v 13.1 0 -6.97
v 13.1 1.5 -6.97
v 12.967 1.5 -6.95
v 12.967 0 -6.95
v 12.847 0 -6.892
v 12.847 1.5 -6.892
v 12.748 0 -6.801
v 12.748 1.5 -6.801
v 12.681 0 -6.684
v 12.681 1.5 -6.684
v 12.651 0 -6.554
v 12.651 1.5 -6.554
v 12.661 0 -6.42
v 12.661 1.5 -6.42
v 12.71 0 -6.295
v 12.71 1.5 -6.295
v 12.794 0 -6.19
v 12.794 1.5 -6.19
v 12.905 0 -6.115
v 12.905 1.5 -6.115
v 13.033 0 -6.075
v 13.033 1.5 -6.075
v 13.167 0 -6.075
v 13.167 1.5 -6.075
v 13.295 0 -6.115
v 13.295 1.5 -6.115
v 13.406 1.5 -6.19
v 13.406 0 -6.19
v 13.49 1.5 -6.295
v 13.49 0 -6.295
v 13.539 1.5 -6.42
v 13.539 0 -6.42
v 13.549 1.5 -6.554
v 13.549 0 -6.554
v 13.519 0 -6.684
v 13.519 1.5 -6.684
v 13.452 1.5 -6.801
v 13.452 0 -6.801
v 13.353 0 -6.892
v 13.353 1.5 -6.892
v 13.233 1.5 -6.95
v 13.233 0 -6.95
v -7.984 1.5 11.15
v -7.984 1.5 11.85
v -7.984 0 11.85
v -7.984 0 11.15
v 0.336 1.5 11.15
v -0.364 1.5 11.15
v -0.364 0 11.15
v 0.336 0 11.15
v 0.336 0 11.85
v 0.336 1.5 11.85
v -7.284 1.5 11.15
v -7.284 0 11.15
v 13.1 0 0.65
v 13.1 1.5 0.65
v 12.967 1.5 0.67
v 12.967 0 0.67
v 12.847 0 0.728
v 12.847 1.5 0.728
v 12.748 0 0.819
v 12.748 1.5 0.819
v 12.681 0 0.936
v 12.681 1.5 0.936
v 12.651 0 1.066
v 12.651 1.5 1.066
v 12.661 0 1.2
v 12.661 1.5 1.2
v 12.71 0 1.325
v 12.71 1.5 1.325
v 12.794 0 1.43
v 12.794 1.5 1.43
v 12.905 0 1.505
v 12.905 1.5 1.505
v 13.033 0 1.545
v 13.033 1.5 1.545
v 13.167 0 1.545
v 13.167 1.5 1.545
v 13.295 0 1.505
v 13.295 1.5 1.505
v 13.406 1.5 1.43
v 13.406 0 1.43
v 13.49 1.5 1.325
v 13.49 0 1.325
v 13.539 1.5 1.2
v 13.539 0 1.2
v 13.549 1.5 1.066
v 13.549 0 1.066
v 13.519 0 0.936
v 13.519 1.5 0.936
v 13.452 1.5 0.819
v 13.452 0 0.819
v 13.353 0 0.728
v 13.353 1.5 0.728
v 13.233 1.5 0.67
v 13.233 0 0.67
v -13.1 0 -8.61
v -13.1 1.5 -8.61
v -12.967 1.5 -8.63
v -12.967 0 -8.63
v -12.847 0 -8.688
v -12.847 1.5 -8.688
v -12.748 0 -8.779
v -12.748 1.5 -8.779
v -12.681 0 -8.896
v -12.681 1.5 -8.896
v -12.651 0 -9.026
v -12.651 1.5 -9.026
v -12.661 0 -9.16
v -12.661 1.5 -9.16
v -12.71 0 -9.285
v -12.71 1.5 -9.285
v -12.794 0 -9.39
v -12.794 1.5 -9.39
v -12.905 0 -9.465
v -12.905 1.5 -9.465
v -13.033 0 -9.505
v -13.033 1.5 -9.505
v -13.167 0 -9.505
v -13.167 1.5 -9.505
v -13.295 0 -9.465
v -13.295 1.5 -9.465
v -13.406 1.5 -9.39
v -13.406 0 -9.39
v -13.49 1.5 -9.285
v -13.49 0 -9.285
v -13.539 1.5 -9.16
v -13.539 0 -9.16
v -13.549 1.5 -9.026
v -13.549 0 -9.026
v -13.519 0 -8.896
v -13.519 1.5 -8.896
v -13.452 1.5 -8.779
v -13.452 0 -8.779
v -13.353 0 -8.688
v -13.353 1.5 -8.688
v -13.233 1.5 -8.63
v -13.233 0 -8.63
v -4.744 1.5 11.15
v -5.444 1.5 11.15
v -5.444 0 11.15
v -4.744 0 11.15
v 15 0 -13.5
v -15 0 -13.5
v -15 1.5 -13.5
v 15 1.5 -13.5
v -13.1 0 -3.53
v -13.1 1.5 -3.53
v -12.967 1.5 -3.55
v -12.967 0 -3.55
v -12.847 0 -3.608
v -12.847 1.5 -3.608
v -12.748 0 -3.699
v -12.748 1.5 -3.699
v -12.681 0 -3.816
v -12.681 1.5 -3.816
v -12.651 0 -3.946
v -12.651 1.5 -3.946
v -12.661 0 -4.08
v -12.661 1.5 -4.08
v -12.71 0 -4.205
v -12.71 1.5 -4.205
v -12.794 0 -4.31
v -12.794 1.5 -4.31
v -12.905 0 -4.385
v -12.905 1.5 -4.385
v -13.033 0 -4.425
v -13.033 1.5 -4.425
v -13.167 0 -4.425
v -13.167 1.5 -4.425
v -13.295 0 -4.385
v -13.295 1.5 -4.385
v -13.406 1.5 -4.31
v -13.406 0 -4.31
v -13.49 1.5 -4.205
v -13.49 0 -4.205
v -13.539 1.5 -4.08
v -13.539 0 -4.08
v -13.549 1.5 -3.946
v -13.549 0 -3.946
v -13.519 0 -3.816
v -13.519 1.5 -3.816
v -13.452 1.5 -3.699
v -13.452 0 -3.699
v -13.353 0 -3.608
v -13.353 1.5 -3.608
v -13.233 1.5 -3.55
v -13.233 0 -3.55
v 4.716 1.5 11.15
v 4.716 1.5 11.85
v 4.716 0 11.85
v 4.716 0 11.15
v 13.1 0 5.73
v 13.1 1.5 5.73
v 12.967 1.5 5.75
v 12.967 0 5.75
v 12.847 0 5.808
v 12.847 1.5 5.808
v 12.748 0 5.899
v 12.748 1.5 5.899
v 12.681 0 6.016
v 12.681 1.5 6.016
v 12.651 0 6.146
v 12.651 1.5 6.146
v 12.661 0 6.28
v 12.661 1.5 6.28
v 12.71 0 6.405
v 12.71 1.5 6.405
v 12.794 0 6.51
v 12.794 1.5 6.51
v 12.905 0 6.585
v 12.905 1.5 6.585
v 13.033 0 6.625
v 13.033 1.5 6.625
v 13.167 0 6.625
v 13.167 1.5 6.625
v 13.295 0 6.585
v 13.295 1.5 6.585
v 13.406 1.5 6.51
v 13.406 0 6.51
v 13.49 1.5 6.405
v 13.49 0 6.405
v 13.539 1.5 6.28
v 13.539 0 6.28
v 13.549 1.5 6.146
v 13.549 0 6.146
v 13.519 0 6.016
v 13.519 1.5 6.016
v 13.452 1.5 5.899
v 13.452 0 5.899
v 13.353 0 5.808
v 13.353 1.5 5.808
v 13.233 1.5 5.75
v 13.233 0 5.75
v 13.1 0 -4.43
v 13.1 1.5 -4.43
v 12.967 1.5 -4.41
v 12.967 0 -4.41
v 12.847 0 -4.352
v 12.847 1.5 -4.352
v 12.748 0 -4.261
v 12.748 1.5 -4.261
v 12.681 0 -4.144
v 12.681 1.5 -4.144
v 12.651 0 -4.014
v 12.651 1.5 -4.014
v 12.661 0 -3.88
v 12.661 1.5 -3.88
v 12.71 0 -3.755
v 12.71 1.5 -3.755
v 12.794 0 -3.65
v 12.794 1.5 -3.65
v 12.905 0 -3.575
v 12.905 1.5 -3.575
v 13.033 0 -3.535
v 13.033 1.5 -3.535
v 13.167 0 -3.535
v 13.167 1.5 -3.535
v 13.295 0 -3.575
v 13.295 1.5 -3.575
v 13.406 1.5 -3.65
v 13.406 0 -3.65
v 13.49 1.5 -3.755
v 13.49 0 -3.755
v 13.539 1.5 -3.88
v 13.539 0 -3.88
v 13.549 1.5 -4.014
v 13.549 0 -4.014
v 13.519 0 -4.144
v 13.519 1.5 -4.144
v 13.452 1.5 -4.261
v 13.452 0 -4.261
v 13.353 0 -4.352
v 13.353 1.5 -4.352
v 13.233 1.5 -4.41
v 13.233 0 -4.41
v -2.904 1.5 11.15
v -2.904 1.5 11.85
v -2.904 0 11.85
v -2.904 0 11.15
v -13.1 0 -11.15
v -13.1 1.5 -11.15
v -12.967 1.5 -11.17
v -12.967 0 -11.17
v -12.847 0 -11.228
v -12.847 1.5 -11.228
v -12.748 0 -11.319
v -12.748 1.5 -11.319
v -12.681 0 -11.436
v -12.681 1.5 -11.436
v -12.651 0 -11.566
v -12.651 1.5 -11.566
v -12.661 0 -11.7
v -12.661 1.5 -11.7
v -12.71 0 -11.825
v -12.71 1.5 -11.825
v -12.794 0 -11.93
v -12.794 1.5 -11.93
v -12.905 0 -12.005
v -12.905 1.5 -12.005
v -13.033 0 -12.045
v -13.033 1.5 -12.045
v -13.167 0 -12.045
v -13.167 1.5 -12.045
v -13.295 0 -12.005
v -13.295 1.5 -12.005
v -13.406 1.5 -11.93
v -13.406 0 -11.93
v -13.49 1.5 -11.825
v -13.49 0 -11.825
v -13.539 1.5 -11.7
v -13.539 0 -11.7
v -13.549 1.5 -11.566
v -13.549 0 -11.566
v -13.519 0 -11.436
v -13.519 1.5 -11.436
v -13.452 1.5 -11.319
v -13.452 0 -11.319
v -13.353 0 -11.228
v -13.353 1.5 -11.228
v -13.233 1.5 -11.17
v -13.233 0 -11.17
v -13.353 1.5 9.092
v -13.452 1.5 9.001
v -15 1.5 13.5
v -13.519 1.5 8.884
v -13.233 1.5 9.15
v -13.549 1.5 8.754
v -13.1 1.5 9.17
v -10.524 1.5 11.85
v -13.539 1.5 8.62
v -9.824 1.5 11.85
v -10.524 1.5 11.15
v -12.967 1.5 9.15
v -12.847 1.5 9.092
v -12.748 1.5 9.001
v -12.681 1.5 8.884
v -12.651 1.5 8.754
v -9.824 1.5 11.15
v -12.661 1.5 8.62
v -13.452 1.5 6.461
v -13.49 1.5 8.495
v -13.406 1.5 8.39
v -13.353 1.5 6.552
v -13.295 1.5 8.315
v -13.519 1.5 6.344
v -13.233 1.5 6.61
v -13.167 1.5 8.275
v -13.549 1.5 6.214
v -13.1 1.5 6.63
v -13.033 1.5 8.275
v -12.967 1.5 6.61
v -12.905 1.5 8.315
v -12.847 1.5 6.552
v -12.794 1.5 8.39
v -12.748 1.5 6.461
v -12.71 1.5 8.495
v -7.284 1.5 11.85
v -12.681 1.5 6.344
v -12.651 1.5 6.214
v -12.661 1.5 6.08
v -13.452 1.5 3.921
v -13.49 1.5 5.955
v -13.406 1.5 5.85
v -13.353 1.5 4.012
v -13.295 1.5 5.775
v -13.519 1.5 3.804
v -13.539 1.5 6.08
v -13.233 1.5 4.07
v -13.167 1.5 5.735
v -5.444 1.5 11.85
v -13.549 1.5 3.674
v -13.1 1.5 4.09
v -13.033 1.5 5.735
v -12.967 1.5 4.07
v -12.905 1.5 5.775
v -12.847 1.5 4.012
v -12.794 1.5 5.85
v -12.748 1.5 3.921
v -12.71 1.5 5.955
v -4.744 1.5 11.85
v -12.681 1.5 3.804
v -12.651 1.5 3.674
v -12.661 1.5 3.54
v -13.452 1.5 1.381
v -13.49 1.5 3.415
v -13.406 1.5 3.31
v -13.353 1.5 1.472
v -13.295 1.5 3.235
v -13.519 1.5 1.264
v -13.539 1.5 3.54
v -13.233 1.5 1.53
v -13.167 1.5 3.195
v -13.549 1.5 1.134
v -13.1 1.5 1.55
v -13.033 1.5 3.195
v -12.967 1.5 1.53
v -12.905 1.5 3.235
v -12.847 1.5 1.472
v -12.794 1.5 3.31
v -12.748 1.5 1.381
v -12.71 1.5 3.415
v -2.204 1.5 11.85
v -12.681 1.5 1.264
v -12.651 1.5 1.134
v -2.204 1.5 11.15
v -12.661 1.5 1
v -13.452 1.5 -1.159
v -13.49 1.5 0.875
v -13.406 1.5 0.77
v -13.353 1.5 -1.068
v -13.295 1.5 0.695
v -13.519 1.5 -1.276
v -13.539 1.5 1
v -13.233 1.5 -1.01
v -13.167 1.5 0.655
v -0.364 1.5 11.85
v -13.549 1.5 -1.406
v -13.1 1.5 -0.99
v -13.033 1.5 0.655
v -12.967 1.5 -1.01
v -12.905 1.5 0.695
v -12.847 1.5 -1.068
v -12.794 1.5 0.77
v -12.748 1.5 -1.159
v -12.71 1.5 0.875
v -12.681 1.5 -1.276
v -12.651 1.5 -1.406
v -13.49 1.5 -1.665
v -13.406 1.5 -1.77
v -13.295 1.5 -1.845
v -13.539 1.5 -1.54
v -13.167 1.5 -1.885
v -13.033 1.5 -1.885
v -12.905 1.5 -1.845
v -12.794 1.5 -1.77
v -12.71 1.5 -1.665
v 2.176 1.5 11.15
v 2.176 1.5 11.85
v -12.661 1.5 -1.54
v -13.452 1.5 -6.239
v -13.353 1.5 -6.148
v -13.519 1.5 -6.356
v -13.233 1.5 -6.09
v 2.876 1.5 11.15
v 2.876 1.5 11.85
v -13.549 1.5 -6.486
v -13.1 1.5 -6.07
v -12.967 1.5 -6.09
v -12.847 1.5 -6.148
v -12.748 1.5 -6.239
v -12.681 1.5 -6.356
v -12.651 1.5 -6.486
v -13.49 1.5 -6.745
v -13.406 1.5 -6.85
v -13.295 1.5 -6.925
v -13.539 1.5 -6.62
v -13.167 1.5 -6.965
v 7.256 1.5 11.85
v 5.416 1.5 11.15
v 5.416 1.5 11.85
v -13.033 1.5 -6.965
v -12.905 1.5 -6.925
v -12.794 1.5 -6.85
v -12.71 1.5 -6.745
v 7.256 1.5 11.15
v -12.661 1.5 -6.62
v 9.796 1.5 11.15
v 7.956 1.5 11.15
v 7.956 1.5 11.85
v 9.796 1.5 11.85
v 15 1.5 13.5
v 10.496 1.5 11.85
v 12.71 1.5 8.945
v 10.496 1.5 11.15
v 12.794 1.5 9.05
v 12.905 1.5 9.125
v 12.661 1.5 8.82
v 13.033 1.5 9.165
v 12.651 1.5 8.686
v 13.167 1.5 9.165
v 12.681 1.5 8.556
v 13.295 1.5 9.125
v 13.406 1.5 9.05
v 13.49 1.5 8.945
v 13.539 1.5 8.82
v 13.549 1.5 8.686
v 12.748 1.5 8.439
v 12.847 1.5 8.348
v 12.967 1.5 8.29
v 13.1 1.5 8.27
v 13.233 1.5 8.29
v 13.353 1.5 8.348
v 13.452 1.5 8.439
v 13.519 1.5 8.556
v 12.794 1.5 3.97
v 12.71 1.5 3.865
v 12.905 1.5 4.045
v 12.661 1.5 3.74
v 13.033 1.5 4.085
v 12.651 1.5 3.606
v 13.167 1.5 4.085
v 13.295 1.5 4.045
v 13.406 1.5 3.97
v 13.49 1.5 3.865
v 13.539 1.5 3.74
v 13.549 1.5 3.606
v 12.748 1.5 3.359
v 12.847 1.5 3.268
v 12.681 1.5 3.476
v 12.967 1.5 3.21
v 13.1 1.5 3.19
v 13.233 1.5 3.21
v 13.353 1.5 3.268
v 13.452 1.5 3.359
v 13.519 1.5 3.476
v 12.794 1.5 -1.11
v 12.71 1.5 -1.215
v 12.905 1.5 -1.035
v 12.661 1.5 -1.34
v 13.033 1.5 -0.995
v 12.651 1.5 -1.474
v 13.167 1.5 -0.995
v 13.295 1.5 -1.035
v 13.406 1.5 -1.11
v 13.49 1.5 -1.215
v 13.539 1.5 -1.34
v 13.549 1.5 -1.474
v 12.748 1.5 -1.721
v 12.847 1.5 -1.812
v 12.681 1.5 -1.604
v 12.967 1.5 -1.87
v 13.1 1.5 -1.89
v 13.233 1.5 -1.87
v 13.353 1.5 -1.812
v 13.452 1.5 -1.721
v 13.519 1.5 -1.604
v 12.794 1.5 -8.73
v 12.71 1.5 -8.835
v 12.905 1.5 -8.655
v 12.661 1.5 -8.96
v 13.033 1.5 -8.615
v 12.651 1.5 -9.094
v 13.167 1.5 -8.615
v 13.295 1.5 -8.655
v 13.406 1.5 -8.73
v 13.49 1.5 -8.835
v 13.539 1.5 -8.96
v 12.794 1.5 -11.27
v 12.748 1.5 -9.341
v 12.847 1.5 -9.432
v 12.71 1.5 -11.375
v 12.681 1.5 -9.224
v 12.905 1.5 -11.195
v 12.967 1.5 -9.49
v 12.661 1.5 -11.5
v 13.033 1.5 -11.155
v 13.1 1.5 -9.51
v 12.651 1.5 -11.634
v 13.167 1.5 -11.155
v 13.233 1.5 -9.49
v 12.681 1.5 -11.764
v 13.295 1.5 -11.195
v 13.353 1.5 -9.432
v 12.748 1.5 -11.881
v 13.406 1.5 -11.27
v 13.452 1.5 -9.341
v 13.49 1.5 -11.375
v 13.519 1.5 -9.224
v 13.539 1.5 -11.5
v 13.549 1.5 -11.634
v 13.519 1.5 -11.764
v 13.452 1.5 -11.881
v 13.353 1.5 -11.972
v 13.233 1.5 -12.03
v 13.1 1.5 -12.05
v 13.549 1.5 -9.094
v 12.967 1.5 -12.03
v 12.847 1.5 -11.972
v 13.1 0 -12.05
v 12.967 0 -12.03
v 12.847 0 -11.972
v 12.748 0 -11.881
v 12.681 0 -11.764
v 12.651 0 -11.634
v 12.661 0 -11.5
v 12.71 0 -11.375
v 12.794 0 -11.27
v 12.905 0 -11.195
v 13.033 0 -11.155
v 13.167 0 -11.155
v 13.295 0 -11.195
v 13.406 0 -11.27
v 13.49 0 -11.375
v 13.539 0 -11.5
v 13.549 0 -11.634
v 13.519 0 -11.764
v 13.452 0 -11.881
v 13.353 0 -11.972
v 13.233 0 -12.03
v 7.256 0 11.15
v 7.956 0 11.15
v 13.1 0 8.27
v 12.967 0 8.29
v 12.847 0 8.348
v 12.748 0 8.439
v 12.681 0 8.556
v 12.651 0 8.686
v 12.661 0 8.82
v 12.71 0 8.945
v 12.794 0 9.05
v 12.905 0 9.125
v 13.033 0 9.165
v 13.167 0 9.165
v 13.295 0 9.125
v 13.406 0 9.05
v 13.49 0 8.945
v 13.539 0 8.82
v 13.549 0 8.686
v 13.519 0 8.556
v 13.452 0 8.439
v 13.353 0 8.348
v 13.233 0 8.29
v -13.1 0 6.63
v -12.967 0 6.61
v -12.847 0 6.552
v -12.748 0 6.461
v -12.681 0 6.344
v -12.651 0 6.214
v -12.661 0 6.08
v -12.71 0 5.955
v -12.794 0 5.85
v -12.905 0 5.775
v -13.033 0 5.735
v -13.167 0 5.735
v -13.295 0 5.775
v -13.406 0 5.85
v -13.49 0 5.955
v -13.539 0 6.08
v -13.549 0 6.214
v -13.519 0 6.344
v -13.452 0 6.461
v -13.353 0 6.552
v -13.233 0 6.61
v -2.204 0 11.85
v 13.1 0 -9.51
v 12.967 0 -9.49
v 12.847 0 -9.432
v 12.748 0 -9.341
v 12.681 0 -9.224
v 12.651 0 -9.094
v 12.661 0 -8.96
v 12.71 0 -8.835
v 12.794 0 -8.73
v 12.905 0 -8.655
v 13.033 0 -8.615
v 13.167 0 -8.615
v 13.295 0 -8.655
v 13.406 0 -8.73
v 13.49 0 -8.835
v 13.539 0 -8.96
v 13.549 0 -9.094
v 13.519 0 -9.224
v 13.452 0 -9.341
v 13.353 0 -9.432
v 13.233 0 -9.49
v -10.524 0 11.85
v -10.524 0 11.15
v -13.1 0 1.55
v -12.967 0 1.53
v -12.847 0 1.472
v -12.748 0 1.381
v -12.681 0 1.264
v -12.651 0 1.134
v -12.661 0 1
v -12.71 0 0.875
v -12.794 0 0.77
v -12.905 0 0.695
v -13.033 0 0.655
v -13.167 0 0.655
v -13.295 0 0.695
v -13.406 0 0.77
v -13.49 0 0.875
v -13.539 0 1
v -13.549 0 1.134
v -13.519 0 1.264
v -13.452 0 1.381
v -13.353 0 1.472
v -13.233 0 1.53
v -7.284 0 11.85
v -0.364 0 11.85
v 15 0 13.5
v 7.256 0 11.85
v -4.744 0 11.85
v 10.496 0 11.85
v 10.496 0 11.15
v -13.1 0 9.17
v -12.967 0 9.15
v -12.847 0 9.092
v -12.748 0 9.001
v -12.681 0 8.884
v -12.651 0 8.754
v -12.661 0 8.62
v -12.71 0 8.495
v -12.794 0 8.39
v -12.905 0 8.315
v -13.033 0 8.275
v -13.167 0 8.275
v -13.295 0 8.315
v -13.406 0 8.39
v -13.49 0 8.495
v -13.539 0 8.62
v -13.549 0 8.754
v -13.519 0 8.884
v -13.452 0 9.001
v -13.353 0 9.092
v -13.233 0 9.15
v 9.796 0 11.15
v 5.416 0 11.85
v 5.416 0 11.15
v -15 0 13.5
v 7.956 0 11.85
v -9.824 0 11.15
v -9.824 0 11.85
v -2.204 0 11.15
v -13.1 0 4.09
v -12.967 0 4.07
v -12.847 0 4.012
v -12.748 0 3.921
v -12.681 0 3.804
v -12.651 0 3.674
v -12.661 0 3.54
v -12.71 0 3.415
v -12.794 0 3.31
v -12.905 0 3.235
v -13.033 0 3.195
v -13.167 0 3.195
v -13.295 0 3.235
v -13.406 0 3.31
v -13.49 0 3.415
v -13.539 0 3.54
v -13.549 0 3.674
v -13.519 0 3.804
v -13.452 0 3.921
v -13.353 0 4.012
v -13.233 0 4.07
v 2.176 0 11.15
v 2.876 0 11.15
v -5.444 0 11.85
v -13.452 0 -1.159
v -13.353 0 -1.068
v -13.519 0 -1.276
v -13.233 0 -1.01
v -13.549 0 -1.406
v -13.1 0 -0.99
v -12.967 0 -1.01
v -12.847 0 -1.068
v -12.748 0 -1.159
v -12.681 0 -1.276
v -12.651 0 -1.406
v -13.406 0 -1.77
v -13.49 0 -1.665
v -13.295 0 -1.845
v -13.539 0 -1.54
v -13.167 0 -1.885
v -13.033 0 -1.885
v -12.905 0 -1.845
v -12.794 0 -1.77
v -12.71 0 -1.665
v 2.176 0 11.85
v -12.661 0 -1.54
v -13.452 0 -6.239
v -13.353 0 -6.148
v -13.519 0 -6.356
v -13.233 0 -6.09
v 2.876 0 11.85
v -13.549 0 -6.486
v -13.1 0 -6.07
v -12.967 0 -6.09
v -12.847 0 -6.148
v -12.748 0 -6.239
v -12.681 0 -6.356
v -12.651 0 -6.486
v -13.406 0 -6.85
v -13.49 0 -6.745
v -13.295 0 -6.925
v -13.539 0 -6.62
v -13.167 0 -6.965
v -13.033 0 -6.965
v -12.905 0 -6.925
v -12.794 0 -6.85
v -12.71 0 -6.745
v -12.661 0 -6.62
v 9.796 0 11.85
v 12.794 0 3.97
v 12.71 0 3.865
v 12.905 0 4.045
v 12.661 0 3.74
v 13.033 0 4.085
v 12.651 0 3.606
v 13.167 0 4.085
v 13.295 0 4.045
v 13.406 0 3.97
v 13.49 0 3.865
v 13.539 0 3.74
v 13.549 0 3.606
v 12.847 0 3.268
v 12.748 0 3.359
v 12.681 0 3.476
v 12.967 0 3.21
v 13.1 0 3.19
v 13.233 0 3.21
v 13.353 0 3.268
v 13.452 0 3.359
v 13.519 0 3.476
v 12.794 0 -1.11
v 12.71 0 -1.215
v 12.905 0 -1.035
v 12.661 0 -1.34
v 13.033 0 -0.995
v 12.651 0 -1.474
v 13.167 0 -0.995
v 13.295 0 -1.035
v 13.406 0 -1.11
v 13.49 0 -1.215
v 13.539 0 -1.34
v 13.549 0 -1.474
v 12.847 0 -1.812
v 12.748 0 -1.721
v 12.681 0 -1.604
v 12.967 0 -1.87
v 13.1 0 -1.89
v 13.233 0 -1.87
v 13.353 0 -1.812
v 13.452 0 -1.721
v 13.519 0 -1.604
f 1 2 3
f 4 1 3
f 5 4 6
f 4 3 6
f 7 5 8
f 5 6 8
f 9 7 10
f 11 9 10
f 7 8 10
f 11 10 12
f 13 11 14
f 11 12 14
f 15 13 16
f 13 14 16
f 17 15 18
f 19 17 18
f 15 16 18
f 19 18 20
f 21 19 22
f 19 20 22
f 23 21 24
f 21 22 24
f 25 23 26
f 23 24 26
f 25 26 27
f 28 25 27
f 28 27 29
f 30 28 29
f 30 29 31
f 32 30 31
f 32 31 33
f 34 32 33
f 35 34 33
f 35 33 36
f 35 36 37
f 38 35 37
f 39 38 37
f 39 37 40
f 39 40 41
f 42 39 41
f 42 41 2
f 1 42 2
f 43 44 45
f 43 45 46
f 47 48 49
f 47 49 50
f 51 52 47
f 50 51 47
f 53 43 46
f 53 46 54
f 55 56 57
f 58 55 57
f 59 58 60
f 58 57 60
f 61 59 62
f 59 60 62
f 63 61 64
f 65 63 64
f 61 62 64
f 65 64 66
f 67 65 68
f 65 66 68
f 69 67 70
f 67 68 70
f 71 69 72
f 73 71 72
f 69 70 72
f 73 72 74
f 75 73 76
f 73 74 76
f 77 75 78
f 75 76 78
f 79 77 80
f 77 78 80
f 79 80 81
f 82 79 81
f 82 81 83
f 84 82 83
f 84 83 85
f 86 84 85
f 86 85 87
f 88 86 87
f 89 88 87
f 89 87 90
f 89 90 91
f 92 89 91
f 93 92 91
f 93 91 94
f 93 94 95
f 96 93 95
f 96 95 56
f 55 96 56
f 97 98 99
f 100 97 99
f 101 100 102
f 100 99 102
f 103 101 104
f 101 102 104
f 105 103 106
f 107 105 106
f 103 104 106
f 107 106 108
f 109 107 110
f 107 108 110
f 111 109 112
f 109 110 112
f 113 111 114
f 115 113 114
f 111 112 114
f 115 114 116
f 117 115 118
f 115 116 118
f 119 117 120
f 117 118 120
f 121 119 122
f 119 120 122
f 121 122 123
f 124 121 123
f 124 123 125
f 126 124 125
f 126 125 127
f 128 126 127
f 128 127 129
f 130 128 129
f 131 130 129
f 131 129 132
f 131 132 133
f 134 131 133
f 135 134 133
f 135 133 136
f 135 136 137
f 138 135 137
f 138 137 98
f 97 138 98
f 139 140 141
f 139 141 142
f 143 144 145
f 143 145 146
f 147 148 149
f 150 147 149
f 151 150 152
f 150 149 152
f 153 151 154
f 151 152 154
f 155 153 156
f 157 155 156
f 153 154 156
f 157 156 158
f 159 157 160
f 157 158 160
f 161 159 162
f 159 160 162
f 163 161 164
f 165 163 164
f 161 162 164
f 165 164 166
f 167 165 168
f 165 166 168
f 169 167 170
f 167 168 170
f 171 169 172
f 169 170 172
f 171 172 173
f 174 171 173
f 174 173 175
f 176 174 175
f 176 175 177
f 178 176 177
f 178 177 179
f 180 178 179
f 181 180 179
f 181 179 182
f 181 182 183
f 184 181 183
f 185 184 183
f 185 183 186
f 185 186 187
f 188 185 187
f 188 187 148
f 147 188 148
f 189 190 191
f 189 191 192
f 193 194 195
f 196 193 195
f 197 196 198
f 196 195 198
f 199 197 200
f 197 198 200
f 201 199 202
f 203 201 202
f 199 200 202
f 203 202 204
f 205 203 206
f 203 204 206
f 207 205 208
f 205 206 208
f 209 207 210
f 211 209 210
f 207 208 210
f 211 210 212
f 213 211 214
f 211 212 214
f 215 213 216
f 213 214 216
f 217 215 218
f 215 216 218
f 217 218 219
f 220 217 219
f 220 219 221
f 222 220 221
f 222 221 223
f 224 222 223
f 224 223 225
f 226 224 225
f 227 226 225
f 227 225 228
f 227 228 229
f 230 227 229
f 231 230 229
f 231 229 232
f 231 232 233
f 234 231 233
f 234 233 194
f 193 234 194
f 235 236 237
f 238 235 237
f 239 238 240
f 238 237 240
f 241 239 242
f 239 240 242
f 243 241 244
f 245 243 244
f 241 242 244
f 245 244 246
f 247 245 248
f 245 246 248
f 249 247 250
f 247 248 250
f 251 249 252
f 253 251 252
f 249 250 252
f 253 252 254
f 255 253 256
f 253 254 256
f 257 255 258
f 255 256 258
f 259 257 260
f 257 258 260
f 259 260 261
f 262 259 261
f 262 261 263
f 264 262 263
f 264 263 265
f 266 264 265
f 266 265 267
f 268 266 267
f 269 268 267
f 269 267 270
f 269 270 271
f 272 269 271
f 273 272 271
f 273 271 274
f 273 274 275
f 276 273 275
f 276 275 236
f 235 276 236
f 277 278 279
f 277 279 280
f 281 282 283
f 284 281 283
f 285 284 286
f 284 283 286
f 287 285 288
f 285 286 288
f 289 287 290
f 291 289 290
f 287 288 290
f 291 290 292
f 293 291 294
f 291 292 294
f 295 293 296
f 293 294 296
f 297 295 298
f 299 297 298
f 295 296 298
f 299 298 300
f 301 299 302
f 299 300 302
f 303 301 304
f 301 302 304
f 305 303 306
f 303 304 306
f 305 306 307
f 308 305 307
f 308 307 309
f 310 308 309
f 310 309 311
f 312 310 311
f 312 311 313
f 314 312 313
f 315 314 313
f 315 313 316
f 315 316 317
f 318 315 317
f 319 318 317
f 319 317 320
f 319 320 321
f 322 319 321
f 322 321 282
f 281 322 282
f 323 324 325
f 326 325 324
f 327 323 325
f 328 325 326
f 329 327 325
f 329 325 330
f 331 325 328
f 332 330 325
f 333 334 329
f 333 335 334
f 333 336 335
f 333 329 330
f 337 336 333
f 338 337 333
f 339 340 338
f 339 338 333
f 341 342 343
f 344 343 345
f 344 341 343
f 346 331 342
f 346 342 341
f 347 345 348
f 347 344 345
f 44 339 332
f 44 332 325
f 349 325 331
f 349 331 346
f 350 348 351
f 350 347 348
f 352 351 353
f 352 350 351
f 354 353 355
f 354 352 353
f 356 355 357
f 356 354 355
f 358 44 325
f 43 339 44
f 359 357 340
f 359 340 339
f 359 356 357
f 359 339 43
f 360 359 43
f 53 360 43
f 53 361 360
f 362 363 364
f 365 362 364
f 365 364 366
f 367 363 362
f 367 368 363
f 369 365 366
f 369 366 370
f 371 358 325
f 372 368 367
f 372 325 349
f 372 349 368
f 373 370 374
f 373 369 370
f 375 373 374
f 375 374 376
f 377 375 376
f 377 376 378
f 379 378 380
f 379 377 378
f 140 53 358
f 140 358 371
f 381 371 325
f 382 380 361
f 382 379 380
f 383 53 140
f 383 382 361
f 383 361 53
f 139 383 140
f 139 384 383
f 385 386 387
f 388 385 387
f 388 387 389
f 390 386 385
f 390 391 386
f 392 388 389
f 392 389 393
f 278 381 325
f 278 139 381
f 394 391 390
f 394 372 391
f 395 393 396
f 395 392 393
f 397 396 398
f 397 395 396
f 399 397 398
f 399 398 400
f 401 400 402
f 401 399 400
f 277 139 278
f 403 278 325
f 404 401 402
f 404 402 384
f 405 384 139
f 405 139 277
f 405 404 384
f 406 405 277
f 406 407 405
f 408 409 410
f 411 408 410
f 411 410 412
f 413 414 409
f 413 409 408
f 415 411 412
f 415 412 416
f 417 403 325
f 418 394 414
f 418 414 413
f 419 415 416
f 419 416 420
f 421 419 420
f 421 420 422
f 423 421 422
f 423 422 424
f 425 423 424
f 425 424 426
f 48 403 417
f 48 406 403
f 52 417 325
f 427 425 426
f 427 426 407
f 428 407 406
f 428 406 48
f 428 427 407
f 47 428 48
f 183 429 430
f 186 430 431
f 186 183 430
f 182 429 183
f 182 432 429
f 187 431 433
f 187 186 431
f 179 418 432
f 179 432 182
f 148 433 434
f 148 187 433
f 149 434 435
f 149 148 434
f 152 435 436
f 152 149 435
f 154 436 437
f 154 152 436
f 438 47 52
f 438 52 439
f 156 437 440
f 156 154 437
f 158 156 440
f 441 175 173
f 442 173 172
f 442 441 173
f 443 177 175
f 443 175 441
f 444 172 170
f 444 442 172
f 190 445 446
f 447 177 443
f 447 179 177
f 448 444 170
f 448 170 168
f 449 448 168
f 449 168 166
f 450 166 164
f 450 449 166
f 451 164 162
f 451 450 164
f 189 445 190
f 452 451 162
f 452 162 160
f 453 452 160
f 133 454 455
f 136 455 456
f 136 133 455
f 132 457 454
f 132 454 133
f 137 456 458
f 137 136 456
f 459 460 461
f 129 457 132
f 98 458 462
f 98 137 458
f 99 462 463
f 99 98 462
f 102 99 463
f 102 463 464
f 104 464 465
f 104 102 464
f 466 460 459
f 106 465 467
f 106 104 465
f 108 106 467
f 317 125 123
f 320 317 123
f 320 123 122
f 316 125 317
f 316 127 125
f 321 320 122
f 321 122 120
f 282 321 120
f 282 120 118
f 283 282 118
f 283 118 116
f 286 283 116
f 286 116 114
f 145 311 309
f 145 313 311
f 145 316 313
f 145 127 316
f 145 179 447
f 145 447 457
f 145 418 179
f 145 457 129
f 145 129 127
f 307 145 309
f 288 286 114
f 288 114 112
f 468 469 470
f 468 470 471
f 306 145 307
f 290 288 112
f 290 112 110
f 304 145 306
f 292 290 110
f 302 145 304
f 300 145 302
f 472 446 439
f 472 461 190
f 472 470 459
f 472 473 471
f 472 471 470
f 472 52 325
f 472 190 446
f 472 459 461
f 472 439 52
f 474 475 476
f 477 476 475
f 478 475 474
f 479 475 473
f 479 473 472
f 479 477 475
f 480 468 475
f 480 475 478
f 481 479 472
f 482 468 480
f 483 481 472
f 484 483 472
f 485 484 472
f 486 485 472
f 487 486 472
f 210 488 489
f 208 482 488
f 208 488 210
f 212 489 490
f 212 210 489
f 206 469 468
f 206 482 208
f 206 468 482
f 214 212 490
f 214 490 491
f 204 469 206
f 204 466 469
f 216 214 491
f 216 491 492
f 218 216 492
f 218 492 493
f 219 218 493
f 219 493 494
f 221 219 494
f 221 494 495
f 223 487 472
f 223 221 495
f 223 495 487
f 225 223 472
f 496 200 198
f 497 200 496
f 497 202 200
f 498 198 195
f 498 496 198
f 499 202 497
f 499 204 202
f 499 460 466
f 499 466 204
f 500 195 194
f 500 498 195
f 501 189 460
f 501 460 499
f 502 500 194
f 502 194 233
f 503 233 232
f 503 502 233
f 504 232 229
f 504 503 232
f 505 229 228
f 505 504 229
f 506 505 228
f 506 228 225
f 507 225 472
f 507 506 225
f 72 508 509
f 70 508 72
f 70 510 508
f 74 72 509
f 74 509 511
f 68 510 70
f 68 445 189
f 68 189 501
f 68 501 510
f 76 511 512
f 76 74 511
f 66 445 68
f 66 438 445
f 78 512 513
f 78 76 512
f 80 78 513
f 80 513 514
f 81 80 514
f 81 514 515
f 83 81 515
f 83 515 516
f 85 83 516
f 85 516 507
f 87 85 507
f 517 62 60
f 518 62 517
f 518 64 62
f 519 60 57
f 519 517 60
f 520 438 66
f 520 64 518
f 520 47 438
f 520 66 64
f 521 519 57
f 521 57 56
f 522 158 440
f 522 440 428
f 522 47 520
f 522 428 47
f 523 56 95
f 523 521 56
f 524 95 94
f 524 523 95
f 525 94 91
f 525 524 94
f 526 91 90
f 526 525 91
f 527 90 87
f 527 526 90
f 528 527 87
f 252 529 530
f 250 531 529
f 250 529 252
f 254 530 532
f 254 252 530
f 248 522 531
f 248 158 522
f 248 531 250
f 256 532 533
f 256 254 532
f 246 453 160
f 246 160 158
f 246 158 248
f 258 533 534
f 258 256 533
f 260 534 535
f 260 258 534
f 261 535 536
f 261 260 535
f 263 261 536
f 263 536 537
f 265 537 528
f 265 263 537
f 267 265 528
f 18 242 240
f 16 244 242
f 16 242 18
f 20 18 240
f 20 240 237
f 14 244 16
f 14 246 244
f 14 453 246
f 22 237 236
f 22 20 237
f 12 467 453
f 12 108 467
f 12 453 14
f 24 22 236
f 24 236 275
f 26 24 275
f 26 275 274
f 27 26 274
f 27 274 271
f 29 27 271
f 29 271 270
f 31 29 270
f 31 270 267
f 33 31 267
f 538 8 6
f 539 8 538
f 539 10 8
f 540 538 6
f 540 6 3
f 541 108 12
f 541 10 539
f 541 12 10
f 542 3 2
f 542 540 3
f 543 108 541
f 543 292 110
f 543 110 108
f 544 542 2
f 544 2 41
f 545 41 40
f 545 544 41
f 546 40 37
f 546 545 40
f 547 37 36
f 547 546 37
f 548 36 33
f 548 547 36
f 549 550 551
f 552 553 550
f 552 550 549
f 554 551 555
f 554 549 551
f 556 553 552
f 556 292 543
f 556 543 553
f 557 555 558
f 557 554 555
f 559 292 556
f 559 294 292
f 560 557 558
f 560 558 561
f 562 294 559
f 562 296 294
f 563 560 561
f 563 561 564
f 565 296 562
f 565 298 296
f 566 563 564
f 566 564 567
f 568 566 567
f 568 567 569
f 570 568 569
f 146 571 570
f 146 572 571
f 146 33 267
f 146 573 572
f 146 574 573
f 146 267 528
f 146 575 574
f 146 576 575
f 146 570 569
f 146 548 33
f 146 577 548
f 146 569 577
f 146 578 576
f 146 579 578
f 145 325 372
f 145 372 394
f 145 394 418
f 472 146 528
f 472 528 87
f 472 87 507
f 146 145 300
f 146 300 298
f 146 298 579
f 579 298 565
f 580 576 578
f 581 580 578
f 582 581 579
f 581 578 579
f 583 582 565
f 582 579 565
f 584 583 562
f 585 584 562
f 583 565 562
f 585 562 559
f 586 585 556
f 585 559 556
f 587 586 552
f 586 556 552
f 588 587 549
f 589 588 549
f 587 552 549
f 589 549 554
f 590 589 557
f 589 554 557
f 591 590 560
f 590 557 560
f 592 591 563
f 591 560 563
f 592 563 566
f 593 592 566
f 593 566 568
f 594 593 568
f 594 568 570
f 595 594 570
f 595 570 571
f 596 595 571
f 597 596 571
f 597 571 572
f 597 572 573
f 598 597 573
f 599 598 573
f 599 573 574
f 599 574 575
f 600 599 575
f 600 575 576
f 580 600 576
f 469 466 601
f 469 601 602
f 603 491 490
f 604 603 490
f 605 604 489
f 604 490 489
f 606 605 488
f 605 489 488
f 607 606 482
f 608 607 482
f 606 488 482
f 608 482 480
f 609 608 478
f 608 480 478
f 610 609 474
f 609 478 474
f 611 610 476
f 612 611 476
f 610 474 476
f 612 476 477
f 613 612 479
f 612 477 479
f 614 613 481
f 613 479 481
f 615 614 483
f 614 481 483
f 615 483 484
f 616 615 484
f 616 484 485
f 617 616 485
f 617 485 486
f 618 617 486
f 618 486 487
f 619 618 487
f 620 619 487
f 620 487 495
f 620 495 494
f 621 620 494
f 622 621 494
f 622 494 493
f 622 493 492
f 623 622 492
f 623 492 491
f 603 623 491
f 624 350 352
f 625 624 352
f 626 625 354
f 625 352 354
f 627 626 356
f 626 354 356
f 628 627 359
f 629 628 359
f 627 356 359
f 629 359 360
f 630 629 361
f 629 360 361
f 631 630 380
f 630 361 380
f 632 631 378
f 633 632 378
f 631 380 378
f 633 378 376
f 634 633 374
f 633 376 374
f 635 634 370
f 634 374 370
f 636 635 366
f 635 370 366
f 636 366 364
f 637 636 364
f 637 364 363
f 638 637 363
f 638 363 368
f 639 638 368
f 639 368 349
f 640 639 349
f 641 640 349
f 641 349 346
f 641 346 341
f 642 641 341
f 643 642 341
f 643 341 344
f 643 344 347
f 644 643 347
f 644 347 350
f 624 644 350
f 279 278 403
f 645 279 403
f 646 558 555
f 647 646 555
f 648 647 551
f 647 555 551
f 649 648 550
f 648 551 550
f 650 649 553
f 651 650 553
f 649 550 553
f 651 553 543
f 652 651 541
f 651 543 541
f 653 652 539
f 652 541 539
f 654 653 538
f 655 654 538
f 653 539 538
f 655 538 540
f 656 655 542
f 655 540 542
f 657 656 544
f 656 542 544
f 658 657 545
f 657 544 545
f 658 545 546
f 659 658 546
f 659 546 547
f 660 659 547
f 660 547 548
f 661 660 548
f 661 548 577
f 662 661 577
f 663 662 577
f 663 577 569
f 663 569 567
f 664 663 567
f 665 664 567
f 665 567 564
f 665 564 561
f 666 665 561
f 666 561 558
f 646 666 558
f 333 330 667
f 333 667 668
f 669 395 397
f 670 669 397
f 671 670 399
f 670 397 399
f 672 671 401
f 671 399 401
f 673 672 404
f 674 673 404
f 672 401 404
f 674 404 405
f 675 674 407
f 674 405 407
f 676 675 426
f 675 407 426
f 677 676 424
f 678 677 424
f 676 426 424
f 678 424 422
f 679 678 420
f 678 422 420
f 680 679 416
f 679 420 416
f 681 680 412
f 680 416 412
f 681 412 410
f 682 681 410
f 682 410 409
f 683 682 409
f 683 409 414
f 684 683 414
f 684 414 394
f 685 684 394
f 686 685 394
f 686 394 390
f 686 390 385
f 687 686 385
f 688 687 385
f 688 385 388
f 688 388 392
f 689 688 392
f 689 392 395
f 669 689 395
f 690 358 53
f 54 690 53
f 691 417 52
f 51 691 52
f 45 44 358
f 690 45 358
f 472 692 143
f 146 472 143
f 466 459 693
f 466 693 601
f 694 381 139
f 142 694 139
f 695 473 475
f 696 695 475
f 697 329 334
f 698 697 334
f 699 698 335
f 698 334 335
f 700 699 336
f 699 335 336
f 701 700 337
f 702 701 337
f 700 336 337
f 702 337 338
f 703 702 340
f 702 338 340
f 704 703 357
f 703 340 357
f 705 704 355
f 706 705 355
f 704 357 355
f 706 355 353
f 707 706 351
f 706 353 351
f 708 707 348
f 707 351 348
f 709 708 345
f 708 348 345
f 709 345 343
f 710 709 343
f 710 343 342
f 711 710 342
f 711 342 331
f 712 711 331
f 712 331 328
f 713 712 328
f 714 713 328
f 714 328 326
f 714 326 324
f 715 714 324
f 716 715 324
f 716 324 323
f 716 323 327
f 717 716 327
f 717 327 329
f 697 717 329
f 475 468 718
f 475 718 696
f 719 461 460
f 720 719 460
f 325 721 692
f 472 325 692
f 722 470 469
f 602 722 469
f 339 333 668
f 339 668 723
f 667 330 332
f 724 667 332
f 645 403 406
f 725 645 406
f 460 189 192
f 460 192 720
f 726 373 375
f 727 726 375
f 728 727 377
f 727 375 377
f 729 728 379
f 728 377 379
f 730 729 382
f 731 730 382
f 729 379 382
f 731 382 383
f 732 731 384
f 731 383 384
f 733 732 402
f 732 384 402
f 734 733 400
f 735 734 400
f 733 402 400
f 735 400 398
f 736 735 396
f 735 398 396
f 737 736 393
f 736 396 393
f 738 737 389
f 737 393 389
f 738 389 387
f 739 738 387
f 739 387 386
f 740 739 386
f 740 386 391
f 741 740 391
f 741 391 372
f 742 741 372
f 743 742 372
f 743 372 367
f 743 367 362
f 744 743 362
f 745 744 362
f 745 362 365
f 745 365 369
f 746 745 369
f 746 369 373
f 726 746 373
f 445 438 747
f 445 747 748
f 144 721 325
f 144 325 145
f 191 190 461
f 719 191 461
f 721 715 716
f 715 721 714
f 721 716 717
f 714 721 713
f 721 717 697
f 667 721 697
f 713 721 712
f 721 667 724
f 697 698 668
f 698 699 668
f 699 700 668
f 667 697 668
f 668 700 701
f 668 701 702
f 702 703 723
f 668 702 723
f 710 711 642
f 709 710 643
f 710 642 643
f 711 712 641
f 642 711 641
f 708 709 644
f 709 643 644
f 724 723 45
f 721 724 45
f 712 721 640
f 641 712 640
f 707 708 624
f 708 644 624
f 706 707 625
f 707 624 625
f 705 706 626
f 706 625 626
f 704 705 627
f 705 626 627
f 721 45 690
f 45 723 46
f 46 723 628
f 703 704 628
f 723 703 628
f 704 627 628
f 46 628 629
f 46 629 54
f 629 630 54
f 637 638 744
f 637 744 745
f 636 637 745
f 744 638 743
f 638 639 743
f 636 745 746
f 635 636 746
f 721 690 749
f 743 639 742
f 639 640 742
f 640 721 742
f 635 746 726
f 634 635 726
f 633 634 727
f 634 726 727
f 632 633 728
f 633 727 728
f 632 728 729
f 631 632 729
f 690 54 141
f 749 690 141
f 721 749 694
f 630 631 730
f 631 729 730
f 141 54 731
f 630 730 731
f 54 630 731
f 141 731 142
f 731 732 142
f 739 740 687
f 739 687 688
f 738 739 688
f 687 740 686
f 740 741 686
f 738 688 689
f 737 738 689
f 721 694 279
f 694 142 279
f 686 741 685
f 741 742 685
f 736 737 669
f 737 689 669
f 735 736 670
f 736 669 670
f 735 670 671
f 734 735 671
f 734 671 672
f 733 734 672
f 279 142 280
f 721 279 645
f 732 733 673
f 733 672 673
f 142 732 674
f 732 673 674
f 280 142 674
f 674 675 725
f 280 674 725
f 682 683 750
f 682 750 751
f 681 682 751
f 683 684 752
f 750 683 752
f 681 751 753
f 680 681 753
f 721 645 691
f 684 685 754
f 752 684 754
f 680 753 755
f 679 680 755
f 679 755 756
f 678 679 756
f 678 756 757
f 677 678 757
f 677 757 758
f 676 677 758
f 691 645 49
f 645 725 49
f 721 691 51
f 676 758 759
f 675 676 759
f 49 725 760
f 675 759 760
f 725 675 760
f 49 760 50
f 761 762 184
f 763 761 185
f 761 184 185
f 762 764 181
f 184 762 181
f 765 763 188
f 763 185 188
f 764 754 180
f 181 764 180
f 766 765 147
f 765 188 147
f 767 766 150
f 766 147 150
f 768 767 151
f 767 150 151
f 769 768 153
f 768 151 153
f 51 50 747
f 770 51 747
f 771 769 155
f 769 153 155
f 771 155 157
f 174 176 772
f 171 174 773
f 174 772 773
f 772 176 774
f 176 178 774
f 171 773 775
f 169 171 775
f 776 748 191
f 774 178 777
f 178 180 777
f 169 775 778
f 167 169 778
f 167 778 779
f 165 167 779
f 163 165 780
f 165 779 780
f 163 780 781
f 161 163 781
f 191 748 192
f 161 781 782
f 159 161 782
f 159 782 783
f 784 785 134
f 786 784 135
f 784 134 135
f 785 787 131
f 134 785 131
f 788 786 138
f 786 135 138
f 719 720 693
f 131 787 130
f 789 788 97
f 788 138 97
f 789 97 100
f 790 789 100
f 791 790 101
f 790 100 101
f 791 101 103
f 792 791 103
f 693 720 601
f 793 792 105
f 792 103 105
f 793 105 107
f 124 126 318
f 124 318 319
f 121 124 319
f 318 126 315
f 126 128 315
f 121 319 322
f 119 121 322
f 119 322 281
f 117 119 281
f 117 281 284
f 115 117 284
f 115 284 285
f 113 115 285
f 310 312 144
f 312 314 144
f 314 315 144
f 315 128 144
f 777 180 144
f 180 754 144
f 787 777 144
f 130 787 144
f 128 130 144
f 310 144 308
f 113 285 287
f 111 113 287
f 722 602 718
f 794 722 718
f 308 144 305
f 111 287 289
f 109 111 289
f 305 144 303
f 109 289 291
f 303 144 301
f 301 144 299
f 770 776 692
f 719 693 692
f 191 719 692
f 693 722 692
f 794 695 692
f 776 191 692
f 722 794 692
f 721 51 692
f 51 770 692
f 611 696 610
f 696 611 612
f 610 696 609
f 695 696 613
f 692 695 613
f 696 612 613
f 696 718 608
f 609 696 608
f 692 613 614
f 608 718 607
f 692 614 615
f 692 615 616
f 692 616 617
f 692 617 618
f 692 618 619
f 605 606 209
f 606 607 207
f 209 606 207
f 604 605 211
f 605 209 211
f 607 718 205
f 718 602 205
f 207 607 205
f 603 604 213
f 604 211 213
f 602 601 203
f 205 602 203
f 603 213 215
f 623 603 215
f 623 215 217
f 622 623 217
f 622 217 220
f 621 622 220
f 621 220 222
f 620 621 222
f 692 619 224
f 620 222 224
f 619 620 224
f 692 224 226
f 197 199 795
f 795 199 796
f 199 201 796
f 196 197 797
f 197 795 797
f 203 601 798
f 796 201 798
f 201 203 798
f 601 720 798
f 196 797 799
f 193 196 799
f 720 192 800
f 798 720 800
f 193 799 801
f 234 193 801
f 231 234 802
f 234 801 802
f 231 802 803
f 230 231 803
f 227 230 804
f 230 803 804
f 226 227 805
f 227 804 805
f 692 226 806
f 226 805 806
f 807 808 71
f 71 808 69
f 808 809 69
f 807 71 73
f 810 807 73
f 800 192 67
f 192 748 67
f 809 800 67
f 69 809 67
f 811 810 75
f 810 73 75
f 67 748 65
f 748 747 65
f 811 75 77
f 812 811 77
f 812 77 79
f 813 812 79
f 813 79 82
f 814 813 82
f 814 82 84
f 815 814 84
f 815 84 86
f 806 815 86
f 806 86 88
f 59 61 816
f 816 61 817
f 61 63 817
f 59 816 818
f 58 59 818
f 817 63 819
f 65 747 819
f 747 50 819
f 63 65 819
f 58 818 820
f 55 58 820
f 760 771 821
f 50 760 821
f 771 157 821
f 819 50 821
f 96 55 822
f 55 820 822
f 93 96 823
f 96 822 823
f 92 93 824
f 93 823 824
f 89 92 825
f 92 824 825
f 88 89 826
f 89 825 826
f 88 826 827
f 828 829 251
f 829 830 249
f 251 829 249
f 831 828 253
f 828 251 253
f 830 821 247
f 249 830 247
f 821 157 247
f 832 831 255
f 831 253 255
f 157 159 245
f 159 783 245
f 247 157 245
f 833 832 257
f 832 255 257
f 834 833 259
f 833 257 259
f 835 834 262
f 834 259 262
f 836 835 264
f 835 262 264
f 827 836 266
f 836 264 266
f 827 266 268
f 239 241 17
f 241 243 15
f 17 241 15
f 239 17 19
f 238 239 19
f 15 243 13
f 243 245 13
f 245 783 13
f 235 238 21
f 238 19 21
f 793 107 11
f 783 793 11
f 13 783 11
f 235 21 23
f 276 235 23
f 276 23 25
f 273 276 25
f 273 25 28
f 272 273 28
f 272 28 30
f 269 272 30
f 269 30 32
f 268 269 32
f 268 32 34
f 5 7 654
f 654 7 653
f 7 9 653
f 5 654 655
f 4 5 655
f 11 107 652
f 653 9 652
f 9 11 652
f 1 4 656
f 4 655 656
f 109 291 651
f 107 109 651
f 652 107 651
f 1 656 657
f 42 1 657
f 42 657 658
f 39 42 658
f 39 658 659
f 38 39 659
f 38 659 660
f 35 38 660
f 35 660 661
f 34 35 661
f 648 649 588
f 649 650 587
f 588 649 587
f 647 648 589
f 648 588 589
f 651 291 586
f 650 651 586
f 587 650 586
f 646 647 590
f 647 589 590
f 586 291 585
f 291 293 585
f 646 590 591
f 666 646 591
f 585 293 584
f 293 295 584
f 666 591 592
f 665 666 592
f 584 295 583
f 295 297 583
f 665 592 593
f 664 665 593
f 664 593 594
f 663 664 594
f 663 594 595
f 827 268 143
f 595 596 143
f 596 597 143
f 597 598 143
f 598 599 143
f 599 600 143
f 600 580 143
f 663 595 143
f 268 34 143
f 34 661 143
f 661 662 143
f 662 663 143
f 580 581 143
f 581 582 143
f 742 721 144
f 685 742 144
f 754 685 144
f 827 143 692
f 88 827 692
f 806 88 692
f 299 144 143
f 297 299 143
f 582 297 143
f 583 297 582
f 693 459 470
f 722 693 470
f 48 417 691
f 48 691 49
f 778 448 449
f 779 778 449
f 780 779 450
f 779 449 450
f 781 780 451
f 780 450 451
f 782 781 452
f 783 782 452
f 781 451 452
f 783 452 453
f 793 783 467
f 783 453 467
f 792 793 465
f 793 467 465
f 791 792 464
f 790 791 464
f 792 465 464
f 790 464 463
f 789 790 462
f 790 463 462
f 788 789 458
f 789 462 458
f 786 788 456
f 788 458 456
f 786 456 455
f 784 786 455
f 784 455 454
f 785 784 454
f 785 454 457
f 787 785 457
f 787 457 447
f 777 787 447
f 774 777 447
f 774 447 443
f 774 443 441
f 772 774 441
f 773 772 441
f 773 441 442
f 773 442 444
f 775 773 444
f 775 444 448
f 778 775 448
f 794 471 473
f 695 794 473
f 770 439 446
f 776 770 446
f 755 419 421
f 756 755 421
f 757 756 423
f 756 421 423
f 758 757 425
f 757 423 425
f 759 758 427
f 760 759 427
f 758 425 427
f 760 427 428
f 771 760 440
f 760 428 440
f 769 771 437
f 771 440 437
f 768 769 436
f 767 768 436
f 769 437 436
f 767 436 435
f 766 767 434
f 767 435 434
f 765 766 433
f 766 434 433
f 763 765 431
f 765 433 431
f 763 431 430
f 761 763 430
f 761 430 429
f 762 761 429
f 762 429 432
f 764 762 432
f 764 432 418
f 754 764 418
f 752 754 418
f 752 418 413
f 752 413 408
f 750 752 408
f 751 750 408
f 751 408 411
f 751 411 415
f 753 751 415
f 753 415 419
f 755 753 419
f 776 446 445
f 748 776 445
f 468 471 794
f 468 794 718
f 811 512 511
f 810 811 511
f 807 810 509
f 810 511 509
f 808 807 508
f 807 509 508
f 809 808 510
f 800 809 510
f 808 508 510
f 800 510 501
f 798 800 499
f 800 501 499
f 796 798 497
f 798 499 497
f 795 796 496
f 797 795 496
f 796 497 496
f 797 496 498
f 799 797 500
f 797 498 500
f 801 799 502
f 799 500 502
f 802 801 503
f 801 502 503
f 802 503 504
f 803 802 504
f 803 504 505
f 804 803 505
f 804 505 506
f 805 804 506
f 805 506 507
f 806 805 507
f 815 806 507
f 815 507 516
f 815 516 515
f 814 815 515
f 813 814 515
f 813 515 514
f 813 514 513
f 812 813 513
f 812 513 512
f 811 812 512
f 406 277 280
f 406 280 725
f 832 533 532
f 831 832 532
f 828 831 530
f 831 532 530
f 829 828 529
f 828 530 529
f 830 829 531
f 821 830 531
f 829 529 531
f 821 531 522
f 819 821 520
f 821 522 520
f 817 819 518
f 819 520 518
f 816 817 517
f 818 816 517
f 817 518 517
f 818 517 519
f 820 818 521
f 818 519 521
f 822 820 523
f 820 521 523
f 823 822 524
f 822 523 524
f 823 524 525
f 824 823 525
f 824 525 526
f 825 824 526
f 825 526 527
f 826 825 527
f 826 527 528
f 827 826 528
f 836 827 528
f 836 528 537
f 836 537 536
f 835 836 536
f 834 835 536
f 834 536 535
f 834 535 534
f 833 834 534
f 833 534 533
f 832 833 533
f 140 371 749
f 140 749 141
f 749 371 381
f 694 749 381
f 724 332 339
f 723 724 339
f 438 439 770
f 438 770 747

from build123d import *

# Parameters (mm, degrees)
SKETCH_1_W          = 30
SKETCH_1_H          = 27
EXTRUDE_1_DEPTH     = 1.5
SKETCH_2_R          = 0.45
SKETCH_2_W          = 0.7
SKETCH_2_H          = 0.7
CUT_EXTRUDE_1_DEPTH = 21.236106345


with BuildPart() as part:
    # Эскиз1 → Бобышка-Вытянуть1 (new body)
    with BuildSketch(Plane(origin=(0, 0, 0), x_dir=(1, 0, 0), z_dir=(0, 1, 0))):
        Rectangle(SKETCH_1_W, SKETCH_1_H)
    extrude(amount=EXTRUDE_1_DEPTH)

    # Эскиз2 → Вырез-Вытянуть1 (cut, through all)
    with BuildSketch(Plane(origin=(0, 1.5, 0), x_dir=(1, 0, 0), z_dir=(0, 1, 0))):
        with Locations(Location((-13.1, -8.72, 0), (0, 0, 270))):
            Circle(SKETCH_2_R)
        with Locations(Location((-13.1, -6.18, 0), (0, 0, 270))):
            Circle(SKETCH_2_R)
        with Locations(Location((-13.1, -3.64, 0), (0, 0, 270))):
            Circle(SKETCH_2_R)
        with Locations(Location((-13.1, -1.1, 0), (0, 0, 270))):
            Circle(SKETCH_2_R)
        with Locations(Location((-13.1, 1.44, 0), (0, 0, 270))):
            Circle(SKETCH_2_R)
        with Locations(Location((-13.1, 3.98, 0), (0, 0, 270))):
            Circle(SKETCH_2_R)
        with Locations(Location((-13.1, 6.52, 0), (0, 0, 270))):
            Circle(SKETCH_2_R)
        with Locations(Location((-13.1, 9.06, 0), (0, 0, 270))):
            Circle(SKETCH_2_R)
        with Locations(Location((-13.1, 11.6, 0), (0, 0, 270))):
            Circle(SKETCH_2_R)
        with Locations(Location((13.1, 11.6, 0), (0, 0, 90))):
            Circle(SKETCH_2_R)
        with Locations(Location((13.1, 9.06, 0), (0, 0, 90))):
            Circle(SKETCH_2_R)
        with Locations(Location((13.1, 6.52, 0), (0, 0, 90))):
            Circle(SKETCH_2_R)
        with Locations(Location((13.1, 3.98, 0), (0, 0, 90))):
            Circle(SKETCH_2_R)
        with Locations(Location((13.1, 1.44, 0), (0, 0, 90))):
            Circle(SKETCH_2_R)
        with Locations(Location((13.1, -1.1, 0), (0, 0, 90))):
            Circle(SKETCH_2_R)
        with Locations(Location((13.1, -3.64, 0), (0, 0, 90))):
            Circle(SKETCH_2_R)
        with Locations(Location((13.1, -6.18, 0), (0, 0, 90))):
            Circle(SKETCH_2_R)
        with Locations(Location((13.1, -8.72, 0), (0, 0, 90))):
            Circle(SKETCH_2_R)
        with Locations((-10.174, -11.5)):
            Rectangle(SKETCH_2_W, SKETCH_2_H)
        with Locations((-7.634, -11.5)):
            Rectangle(SKETCH_2_W, SKETCH_2_H)
        with Locations((-5.094, -11.5)):
            Rectangle(SKETCH_2_W, SKETCH_2_H)
        with Locations((-2.554, -11.5)):
            Rectangle(SKETCH_2_W, SKETCH_2_H)
        with Locations((-0.014, -11.5)):
            Rectangle(SKETCH_2_W, SKETCH_2_H)
        with Locations((2.526, -11.5)):
            Rectangle(SKETCH_2_W, SKETCH_2_H)
        with Locations((5.066, -11.5)):
            Rectangle(SKETCH_2_W, SKETCH_2_H)
        with Locations((7.606, -11.5)):
            Rectangle(SKETCH_2_W, SKETCH_2_H)
        with Locations((10.146, -11.5)):
            Rectangle(SKETCH_2_W, SKETCH_2_H)
    extrude(amount=-CUT_EXTRUDE_1_DEPTH, mode=Mode.SUBTRACT)


solid = part.part
